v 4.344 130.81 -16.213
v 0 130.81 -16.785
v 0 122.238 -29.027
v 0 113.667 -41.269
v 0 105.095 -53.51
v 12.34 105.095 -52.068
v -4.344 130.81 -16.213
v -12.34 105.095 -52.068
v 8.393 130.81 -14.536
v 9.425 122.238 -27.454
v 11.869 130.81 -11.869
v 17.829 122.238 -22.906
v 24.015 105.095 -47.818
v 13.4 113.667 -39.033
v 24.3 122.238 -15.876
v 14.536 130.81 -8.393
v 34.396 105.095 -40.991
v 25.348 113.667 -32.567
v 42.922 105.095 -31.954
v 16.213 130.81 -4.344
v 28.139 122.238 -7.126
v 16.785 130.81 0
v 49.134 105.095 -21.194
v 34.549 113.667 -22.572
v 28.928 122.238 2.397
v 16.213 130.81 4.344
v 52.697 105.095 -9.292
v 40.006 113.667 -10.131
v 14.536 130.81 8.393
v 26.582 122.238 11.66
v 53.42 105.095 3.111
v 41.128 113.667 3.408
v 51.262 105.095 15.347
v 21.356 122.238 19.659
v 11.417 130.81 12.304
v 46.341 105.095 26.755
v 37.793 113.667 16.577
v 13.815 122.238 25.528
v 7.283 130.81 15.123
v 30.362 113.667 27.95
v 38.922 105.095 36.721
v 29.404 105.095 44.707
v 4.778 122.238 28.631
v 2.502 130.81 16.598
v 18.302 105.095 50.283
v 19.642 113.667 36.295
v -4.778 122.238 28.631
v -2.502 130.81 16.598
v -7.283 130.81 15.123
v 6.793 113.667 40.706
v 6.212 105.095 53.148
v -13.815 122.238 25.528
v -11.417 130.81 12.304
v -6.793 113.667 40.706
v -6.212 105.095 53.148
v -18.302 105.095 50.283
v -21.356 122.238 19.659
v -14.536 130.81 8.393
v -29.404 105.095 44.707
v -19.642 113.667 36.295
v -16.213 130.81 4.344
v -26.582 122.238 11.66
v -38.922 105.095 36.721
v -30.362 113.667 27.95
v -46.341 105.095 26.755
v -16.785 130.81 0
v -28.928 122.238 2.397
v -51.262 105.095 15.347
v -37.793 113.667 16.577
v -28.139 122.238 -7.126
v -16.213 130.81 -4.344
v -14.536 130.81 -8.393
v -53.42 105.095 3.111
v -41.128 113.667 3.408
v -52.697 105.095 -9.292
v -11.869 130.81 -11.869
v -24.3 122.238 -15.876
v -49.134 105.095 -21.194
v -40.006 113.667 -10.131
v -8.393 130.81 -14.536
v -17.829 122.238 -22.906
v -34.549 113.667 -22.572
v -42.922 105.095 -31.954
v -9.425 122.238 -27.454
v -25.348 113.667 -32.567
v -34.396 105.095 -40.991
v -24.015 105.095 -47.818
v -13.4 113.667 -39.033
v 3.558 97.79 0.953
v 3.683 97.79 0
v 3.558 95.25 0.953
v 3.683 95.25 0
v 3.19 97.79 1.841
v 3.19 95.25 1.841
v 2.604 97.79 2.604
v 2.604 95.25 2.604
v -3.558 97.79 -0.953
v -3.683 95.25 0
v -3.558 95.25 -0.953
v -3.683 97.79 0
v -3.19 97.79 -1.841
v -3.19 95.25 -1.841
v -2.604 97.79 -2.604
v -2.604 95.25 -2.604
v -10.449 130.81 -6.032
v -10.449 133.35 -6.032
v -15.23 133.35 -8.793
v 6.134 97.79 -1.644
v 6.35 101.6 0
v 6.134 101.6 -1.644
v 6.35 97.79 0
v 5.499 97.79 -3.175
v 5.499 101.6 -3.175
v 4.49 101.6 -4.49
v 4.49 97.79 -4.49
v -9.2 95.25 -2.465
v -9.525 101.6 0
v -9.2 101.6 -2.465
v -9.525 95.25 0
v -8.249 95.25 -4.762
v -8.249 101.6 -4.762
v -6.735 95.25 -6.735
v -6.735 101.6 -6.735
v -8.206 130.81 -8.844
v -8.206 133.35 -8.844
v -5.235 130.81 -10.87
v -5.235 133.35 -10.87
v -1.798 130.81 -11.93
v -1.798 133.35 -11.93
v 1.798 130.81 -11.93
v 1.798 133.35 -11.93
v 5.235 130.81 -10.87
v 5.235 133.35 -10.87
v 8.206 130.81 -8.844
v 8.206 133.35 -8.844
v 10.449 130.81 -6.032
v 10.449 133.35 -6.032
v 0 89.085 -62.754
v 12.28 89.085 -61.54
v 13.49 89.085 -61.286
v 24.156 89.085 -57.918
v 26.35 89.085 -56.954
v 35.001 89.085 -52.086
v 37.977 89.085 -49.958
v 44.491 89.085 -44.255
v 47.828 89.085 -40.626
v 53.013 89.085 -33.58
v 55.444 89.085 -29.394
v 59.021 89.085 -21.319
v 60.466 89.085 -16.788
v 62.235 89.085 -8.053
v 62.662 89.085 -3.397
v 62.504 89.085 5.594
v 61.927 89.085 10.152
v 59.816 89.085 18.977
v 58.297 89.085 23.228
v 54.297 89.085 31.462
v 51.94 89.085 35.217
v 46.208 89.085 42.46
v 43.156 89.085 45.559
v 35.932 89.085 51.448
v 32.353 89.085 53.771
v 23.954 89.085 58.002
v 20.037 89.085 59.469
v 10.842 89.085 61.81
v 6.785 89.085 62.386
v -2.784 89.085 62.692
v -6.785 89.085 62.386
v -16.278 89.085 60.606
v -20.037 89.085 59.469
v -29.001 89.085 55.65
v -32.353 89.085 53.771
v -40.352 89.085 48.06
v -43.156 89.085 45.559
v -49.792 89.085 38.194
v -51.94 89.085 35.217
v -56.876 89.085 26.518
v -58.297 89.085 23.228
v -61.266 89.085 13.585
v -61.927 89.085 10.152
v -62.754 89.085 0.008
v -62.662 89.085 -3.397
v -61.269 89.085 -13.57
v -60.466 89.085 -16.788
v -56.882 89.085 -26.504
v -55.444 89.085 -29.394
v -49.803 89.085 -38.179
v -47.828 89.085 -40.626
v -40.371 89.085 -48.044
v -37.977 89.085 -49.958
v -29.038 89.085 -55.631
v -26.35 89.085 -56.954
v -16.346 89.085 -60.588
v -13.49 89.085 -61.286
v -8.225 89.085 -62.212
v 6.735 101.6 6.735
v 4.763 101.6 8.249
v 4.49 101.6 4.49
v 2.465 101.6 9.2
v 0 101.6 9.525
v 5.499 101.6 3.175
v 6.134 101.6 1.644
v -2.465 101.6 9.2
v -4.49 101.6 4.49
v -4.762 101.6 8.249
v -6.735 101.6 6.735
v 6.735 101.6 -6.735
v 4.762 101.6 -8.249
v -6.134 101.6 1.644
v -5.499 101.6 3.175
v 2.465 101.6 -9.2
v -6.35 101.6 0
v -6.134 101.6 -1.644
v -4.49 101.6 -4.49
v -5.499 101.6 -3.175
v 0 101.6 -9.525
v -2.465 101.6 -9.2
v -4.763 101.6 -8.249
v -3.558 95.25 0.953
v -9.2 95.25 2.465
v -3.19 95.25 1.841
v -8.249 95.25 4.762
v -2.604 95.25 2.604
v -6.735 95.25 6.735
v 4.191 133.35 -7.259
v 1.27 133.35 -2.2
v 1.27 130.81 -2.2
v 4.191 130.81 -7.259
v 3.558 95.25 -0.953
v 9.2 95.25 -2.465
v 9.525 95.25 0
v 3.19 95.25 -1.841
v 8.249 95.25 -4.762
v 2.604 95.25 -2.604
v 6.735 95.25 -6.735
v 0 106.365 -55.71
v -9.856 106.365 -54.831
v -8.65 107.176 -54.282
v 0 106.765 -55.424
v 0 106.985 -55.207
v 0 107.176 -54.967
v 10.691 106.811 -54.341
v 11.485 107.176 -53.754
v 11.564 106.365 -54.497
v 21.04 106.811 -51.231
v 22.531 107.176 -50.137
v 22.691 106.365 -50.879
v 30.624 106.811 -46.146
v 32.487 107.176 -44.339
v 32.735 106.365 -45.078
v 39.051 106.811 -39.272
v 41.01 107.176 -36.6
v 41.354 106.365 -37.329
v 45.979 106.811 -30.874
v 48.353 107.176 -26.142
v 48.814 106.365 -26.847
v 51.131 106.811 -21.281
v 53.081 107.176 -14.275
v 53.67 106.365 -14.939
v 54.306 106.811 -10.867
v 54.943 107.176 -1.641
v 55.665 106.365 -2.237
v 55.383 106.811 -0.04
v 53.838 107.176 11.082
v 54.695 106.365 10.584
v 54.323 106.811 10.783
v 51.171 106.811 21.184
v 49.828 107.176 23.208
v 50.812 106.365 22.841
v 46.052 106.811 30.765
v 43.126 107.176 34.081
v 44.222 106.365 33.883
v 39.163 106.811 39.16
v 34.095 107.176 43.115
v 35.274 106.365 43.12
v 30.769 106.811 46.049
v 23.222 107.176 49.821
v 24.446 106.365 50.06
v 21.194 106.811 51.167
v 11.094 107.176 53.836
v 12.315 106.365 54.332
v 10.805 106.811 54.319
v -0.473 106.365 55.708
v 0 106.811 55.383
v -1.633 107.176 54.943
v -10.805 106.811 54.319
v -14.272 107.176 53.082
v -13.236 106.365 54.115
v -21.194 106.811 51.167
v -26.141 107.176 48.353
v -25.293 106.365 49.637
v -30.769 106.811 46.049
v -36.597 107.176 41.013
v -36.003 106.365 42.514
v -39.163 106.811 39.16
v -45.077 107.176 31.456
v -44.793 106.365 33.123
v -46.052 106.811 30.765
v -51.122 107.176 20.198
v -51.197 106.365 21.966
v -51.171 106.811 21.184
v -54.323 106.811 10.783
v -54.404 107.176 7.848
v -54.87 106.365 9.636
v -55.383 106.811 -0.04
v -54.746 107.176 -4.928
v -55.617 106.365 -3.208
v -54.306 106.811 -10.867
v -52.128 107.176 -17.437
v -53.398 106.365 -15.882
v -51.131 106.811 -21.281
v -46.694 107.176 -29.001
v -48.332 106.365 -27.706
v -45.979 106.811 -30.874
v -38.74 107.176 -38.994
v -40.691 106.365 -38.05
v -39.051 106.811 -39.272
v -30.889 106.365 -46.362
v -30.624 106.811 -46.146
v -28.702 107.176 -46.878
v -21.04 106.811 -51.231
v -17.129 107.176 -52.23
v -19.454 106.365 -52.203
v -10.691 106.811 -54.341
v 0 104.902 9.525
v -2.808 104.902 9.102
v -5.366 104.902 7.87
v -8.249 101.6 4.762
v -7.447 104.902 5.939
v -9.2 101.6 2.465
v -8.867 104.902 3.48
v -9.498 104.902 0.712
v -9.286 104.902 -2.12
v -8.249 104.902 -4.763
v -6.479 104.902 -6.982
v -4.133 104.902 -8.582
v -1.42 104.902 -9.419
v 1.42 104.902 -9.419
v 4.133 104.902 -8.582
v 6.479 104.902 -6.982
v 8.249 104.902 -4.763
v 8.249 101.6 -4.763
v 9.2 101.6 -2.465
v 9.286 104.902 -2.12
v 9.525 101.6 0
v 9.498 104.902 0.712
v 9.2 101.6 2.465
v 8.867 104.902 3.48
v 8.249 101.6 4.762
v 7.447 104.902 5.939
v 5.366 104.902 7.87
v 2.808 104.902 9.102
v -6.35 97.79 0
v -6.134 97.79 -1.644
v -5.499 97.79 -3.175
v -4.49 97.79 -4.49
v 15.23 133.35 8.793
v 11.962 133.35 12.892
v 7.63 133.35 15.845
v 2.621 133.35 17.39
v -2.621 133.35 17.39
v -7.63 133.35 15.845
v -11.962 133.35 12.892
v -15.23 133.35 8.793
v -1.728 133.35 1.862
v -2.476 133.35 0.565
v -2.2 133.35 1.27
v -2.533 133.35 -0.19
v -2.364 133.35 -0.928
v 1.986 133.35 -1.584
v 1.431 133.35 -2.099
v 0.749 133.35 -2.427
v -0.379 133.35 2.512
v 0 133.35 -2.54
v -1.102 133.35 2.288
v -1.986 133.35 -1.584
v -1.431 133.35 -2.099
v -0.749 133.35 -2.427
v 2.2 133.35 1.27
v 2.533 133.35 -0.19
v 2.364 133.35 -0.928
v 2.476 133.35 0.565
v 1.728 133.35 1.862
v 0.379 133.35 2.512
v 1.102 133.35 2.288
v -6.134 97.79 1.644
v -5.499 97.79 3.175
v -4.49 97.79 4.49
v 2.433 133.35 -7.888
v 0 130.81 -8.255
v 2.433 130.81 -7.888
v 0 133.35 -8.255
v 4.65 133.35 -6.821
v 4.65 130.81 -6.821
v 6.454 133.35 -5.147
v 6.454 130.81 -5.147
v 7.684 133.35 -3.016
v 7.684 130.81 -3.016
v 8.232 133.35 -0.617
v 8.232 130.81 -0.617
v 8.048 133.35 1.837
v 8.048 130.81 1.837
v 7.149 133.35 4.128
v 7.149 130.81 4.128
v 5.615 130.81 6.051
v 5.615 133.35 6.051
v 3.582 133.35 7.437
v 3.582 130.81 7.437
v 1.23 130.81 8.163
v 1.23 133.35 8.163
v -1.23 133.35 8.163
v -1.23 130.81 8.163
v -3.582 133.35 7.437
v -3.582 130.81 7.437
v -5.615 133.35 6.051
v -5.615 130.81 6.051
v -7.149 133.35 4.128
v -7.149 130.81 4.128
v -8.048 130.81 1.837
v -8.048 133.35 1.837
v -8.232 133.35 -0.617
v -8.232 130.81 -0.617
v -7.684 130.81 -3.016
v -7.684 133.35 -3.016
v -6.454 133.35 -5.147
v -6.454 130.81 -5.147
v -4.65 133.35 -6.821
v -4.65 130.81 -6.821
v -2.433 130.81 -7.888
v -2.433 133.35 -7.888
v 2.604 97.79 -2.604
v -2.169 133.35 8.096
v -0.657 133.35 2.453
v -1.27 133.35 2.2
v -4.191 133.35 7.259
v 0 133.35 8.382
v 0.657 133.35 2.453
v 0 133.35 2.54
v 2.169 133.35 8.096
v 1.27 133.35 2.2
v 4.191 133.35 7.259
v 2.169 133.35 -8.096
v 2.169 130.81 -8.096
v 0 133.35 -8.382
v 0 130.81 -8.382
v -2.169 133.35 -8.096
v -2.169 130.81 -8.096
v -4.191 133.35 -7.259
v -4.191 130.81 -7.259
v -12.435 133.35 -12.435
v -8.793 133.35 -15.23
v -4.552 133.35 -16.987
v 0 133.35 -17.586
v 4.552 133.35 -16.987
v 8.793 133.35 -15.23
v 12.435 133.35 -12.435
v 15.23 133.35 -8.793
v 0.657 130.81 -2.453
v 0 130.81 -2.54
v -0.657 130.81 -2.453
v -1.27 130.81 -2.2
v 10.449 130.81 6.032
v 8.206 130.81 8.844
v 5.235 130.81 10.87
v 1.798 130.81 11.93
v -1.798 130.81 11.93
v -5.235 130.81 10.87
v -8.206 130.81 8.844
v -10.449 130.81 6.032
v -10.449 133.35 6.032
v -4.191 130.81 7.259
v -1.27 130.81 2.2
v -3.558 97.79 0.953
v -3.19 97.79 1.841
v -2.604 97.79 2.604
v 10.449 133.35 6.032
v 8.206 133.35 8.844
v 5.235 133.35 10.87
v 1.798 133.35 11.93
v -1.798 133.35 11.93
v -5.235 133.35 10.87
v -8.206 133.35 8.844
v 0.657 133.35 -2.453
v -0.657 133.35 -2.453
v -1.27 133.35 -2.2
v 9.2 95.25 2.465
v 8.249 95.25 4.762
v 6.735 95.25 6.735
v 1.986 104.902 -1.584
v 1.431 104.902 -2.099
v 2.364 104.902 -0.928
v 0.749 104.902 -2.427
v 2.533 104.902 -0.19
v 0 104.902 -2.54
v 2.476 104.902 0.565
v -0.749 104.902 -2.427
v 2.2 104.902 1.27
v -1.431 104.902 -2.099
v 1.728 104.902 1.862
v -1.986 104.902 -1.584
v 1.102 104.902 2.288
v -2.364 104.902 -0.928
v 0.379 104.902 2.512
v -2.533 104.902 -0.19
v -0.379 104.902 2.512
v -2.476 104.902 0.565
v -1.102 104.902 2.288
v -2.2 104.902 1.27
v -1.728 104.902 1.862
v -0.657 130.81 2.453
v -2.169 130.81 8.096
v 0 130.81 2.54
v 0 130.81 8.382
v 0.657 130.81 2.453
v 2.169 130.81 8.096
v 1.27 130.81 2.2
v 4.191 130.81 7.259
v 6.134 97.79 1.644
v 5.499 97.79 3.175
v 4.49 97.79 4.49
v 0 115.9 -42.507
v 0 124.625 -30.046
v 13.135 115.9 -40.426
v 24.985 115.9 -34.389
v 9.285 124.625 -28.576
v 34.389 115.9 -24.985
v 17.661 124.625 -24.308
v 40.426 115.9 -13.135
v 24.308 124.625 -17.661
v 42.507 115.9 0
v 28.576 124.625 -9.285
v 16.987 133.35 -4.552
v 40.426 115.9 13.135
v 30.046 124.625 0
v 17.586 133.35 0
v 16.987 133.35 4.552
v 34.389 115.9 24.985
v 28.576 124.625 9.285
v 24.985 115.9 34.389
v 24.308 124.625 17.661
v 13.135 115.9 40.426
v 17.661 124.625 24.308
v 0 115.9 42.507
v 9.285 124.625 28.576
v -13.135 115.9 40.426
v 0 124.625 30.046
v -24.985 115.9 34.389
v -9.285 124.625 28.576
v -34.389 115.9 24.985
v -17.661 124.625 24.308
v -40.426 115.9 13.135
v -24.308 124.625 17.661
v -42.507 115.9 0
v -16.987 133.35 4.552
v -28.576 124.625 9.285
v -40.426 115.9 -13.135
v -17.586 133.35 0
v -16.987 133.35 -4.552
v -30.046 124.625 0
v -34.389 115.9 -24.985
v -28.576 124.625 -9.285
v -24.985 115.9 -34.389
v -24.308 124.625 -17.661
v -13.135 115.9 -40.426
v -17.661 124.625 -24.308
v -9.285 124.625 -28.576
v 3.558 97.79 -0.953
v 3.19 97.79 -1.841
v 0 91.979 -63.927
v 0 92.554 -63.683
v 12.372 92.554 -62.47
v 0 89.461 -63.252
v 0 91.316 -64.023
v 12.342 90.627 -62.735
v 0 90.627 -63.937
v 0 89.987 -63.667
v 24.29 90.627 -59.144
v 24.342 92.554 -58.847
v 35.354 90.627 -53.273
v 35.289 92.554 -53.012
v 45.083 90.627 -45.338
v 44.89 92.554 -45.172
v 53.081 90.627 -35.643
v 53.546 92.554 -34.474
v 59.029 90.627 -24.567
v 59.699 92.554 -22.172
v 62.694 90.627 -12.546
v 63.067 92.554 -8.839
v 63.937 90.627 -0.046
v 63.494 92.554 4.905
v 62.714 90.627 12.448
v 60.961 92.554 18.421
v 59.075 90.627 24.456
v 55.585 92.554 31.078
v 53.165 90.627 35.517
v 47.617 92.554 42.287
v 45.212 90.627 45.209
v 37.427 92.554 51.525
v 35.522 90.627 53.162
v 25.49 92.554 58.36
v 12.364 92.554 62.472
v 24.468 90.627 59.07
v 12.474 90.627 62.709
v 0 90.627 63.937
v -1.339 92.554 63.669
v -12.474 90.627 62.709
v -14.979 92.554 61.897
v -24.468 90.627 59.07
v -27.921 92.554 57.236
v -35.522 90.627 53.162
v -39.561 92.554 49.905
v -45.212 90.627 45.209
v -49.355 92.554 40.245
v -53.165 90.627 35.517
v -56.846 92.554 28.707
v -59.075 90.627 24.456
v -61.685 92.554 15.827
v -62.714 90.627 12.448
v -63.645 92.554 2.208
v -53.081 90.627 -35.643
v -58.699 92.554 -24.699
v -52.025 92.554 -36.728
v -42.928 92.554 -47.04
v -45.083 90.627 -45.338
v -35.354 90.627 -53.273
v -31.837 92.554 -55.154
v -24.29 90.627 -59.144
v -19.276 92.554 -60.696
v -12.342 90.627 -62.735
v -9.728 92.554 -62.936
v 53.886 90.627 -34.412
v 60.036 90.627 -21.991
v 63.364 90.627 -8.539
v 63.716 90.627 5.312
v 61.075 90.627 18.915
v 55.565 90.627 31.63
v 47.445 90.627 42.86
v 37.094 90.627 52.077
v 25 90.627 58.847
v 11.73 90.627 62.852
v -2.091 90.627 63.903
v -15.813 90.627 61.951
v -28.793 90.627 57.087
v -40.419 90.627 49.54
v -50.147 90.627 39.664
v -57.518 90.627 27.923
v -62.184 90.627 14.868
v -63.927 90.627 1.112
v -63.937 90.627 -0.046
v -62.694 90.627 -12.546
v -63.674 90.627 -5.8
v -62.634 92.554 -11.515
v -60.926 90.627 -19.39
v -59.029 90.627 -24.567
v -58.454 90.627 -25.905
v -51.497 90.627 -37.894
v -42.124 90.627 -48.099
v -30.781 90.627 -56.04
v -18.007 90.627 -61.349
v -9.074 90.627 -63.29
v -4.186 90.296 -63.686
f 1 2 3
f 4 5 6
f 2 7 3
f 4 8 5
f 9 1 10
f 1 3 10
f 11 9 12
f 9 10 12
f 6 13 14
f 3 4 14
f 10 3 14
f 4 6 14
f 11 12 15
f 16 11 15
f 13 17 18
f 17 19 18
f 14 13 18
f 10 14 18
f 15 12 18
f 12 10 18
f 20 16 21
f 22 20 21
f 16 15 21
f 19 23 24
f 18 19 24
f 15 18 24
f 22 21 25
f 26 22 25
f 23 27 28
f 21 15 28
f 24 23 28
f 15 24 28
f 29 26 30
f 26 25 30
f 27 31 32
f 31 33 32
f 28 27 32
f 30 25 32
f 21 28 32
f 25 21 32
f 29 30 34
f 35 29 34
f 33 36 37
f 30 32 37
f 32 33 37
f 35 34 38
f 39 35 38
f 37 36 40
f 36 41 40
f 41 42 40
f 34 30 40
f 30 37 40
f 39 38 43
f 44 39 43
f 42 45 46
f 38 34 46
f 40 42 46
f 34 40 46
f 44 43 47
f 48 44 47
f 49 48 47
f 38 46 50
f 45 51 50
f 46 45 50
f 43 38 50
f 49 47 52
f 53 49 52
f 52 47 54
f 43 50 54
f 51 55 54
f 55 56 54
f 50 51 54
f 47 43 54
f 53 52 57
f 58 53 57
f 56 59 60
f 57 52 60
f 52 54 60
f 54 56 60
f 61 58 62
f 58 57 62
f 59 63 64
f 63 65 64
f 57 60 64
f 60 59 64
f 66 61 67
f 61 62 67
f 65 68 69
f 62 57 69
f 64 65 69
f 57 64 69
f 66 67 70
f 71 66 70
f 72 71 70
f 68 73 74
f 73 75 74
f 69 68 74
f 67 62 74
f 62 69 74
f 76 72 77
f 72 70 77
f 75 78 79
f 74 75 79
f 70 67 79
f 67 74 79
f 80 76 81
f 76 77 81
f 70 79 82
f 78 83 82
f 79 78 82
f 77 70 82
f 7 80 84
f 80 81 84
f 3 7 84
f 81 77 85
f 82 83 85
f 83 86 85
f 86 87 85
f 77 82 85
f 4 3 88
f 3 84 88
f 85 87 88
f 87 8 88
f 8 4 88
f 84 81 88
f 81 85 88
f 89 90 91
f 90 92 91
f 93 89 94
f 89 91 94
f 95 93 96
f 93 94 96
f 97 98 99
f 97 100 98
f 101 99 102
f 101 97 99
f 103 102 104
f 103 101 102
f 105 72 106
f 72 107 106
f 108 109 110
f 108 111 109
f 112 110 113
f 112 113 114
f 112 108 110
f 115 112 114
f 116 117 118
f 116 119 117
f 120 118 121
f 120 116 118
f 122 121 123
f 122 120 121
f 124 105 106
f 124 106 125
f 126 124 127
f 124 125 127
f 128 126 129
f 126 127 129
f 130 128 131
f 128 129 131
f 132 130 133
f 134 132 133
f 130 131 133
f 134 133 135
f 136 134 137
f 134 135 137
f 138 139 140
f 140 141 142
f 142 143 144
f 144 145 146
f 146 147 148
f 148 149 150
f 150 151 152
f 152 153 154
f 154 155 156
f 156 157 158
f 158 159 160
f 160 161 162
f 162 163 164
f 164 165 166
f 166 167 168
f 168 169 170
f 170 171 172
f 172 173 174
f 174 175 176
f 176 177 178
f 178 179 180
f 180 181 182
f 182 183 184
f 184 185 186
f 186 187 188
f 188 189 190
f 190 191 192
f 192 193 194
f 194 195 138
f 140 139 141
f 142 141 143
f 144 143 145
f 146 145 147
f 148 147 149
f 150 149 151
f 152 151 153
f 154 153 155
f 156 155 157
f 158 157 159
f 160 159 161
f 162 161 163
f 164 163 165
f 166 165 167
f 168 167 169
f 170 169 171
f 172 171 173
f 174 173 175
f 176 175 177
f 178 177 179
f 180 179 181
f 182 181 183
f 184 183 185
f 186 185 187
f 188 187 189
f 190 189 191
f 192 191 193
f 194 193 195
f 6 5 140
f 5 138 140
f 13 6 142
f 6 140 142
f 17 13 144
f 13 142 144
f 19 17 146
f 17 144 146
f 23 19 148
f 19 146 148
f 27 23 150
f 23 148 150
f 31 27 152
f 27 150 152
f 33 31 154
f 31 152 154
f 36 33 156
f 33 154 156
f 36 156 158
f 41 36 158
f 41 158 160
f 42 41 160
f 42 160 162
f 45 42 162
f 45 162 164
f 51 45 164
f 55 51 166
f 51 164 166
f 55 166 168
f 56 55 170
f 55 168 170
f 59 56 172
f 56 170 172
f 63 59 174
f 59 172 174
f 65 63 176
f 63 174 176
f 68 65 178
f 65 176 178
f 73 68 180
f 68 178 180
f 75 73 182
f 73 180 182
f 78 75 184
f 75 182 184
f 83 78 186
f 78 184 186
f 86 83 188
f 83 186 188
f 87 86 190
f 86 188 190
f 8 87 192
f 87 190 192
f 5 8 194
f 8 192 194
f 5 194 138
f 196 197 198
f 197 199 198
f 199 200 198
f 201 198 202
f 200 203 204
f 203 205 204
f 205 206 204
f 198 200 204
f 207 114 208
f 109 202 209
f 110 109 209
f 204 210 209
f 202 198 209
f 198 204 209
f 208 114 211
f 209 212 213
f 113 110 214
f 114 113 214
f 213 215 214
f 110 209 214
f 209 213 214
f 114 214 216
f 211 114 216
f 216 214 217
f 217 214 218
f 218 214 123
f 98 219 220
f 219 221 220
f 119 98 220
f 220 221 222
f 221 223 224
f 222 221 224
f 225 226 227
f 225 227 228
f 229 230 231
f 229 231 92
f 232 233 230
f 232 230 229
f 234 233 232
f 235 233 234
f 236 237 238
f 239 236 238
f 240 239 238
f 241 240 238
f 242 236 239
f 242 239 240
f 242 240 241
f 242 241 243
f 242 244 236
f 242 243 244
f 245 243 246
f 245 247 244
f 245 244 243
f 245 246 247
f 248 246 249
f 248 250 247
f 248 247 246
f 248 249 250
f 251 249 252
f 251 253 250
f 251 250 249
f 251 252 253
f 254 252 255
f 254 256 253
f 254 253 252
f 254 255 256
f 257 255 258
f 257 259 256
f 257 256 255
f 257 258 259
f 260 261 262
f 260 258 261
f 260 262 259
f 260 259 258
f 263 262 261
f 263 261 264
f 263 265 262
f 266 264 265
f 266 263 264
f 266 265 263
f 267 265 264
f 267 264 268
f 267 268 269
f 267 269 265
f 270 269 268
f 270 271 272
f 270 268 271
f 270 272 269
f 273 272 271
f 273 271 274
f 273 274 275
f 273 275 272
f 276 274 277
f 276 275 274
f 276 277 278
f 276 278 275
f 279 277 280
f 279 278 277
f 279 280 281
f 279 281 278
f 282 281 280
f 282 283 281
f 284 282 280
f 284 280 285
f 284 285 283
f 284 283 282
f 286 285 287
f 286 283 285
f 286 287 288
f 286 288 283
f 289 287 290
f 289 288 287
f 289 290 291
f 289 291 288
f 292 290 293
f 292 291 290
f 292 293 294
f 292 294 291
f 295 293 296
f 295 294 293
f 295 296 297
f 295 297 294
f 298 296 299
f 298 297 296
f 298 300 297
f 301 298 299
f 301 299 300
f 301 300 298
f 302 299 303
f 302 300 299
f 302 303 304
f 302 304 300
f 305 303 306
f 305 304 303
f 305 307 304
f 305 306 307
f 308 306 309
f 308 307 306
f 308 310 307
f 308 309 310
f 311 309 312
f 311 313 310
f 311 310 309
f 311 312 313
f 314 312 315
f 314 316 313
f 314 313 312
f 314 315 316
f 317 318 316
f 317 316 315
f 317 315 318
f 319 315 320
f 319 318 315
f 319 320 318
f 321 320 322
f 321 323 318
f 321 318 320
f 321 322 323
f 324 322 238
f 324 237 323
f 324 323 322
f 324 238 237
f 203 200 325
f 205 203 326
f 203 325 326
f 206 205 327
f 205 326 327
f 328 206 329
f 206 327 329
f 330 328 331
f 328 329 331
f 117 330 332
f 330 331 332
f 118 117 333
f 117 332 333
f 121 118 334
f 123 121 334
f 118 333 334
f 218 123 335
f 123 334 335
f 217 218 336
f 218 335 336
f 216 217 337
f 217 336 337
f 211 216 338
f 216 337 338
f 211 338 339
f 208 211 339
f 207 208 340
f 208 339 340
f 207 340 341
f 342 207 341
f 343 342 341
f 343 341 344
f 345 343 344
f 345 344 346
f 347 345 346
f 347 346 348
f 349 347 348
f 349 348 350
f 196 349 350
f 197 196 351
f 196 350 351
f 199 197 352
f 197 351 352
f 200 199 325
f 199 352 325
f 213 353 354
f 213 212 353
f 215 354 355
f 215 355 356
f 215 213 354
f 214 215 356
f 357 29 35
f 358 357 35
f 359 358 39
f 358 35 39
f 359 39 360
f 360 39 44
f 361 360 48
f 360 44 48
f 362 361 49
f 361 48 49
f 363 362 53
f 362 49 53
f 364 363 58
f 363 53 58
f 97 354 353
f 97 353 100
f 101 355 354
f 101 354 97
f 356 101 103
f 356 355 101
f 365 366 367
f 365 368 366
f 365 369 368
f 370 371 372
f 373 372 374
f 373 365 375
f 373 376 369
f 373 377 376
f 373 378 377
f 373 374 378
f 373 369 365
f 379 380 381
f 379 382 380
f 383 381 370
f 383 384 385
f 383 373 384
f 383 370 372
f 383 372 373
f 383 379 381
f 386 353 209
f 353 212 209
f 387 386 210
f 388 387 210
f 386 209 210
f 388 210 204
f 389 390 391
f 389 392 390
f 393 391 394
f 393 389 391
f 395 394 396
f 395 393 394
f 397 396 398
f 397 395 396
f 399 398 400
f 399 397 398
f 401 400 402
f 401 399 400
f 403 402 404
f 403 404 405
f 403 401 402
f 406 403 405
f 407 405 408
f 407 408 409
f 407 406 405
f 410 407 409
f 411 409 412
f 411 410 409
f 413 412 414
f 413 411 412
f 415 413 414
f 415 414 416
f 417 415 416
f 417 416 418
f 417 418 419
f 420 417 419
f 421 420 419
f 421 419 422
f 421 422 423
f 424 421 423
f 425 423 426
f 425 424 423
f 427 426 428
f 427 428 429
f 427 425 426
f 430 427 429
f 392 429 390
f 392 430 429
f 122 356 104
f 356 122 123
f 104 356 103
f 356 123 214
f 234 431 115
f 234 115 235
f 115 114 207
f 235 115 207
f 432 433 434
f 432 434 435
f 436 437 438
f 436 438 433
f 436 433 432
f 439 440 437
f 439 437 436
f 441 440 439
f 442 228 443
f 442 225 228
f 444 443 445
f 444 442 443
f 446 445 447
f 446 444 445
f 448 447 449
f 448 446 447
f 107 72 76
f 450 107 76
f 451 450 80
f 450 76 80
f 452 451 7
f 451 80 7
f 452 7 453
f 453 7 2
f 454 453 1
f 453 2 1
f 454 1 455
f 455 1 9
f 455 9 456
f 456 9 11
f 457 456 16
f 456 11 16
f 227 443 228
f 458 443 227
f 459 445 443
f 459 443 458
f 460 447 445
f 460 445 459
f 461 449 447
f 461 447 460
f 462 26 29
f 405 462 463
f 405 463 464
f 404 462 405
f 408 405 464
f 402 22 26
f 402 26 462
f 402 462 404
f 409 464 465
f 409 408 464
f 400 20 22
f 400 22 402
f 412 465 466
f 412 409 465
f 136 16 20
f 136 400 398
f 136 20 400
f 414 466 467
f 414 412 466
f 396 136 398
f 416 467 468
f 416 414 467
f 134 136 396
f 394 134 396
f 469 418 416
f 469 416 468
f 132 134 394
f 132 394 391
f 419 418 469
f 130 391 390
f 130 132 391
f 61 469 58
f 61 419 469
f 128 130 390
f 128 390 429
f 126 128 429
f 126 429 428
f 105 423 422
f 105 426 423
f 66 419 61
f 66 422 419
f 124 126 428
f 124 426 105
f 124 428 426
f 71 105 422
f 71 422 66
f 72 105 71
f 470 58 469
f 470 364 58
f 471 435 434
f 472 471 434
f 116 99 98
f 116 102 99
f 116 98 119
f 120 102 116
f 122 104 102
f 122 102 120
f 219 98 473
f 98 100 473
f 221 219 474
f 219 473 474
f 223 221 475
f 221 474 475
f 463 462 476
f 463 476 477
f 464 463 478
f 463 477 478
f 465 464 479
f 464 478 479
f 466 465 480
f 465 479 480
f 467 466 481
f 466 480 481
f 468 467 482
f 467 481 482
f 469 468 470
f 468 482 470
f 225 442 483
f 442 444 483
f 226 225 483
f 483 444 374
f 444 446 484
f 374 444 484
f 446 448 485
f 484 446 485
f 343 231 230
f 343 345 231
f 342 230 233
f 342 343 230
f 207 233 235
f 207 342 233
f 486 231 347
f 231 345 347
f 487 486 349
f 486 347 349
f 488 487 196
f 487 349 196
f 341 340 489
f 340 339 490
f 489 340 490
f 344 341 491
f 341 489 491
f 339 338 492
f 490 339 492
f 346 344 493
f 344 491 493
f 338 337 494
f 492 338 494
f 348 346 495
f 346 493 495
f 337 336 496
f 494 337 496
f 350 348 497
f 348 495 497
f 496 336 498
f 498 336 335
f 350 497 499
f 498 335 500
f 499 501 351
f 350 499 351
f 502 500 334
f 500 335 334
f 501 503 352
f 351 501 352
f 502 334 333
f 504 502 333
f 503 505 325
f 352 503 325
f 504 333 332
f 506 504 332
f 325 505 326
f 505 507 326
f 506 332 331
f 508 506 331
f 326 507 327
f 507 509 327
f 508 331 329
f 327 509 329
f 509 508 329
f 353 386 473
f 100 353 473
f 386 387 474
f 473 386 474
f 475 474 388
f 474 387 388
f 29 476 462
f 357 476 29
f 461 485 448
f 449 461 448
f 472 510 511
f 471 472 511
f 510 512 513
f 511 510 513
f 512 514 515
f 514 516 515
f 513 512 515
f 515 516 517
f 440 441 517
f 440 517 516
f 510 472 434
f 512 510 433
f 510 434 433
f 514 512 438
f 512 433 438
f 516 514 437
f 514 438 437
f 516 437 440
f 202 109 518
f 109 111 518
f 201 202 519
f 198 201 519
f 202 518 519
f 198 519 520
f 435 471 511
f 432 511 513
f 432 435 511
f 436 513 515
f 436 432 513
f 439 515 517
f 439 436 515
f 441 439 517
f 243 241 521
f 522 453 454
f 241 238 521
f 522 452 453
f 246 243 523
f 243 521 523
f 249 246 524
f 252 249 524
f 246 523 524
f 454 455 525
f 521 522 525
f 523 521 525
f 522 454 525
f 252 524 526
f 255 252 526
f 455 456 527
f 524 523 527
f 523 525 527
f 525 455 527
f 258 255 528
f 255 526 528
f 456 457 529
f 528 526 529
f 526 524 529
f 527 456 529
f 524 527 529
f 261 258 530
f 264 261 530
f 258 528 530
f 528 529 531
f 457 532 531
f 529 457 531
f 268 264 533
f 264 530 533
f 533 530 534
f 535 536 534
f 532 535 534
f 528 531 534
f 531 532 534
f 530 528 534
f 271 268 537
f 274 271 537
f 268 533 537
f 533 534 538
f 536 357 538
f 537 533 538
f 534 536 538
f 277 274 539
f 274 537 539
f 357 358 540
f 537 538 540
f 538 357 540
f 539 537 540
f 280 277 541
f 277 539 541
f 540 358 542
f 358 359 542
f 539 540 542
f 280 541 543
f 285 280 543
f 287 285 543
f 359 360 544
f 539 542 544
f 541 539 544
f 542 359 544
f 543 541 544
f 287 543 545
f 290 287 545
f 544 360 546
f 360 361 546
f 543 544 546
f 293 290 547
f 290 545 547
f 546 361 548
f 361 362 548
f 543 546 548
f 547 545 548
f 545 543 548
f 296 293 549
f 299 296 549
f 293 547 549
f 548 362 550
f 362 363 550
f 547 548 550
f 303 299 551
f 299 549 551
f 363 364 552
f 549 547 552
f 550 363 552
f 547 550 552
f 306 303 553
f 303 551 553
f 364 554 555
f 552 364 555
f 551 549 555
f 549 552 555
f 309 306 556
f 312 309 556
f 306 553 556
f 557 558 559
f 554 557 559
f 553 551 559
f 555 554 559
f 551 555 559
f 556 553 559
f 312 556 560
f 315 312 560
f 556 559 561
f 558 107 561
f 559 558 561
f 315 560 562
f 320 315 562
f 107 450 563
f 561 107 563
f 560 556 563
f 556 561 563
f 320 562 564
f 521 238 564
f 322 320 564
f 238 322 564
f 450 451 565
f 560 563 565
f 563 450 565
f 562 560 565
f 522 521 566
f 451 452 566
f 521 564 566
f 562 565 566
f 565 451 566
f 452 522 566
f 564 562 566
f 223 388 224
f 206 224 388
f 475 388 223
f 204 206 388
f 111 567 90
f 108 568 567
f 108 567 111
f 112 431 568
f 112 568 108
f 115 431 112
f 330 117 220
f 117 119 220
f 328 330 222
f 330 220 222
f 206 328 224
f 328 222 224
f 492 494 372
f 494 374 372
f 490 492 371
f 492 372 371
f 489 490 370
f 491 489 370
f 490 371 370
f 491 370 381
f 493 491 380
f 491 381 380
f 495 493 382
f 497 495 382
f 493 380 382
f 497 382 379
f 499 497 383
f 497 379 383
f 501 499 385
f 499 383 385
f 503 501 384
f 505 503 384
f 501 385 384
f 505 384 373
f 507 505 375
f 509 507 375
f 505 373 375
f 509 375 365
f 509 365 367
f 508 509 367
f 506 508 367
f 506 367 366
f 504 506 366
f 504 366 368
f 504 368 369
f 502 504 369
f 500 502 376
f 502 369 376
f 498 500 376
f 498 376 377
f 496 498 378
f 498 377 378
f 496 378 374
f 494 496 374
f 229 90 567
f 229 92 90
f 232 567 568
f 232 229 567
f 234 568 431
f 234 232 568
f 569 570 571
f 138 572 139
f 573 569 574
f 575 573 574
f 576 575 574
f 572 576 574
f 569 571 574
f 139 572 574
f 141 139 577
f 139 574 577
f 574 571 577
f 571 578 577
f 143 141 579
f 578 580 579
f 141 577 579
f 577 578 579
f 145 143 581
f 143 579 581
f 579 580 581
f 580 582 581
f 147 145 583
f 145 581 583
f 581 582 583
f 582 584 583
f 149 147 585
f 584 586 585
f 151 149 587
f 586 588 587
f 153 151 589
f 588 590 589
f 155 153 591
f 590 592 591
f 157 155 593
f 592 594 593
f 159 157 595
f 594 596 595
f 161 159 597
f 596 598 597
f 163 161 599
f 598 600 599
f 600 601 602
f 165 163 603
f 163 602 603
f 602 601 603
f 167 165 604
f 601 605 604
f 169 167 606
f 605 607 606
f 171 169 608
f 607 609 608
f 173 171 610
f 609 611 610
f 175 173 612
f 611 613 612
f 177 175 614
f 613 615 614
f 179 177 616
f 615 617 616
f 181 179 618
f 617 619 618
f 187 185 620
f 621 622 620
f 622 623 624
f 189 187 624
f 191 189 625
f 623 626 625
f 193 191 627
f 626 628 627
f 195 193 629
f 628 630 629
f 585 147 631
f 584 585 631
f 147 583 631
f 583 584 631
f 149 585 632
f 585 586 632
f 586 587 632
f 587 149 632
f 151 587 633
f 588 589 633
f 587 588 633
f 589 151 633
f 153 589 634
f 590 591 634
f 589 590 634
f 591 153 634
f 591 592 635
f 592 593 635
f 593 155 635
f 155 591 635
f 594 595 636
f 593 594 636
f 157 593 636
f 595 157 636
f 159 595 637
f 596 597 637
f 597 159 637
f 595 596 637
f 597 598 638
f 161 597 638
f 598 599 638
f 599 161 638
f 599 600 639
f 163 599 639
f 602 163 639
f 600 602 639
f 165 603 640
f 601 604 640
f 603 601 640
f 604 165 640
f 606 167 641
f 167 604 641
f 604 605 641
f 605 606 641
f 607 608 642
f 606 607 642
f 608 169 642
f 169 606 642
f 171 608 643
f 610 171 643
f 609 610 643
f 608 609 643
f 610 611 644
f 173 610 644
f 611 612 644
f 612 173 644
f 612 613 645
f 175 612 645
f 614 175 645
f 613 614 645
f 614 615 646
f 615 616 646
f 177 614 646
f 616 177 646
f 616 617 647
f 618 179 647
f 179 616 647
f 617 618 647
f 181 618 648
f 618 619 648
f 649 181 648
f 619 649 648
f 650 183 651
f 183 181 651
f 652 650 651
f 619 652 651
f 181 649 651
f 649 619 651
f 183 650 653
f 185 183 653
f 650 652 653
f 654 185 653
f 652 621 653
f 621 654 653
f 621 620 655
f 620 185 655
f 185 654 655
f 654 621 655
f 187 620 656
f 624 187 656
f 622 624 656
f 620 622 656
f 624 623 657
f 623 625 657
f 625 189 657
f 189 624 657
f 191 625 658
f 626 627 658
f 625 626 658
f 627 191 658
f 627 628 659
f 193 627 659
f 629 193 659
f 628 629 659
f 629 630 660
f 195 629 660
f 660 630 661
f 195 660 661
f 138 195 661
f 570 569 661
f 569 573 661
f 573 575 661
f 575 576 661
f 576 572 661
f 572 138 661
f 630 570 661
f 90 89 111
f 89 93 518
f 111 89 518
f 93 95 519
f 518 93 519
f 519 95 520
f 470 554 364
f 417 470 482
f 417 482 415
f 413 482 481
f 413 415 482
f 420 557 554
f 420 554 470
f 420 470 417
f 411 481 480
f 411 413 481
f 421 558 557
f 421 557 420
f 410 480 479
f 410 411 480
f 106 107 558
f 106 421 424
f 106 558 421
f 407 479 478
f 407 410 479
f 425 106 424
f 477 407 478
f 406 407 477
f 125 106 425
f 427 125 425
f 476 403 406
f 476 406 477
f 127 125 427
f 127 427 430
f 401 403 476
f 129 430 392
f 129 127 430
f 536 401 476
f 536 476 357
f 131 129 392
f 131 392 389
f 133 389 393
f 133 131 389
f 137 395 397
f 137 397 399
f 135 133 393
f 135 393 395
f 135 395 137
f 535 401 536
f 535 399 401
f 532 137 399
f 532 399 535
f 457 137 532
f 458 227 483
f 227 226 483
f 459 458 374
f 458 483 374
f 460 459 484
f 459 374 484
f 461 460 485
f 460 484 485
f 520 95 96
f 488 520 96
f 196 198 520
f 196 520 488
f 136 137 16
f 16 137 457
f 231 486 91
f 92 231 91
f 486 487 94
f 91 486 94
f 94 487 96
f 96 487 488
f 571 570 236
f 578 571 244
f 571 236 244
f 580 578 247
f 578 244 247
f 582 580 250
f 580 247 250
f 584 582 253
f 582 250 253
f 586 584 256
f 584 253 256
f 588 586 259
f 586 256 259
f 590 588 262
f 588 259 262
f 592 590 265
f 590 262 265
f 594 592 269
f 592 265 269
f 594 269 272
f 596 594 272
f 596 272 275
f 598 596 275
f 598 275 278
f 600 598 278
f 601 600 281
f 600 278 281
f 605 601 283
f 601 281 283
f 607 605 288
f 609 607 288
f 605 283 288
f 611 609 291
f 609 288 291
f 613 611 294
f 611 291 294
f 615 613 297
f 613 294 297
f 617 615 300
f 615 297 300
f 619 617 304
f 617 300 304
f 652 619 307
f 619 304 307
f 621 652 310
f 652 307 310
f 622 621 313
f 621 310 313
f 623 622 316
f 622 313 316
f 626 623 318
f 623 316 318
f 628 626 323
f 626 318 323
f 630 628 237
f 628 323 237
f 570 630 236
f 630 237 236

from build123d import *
from build123d.topology import SkipClean

# Parameters (mm, degrees)
REVOLVE5_ANGLE  = 90
SKETCH1_24_W    = 2.54
SKETCH1_24_H    = 25.908
SKETCH1_24_H_2  = 2.54
SKETCH1_24_W_2  = 3.81
REVOLVE9_ANGLE  = 60
SKETCH2_W       = 5.842
SKETCH2_H       = 2.54
REVOLVE10_ANGLE = 60
FILLET1_R       = 2.54
FILLET2_R       = 2.54


with BuildPart() as part:
    # Sketch1 → Revolve4 (revolve)
    with BuildSketch(Plane.XY, mode=Mode.PRIVATE) as revolve4_sk:
        Polygon((9.525, 101.6), (9.525, 104.902), (2.54, 104.902), (0, 104.902), (0, 101.6), (6.35, 101.6), align=None)
    revolve(revolve4_sk.sketch.rotate(Axis((0, 133.35, 0), (0, -1, 0)), 90), axis=Axis((0, 133.35, 0), (0, -1, 0)))

    # Sketch1<21> → Revolve5 (revolve, symmetric)
    with SkipClean():  # the faces are left unmerged after this step: merging them gives an invalid solid
        with BuildSketch(Plane.XY) as revolve5_sk:
            Polygon((9.525, 95.25), (9.525, 101.6), (6.35, 101.6), (6.35, 97.79), (3.683, 97.79), (3.683, 95.25), align=None)
            Polygon((-6.35, 97.79), (-6.35, 101.6), (-9.525, 101.6), (-9.525, 95.25), (-3.683, 95.25), (-3.683, 97.79), align=None)
        revolve(axis=Axis((0, 133.35, 0), (0, -1, 0)), revolution_arc=REVOLVE5_ANGLE / 2)
        revolve(revolve5_sk.sketch, axis=Axis((0, 133.35, 0), (0, 1, 0)), revolution_arc=REVOLVE5_ANGLE / 2)
    add(part.part.scale(1), mode=Mode.REPLACE)  # the faces are merged on a copy

    # Sketch1<24> → Revolve7 (revolve)
    with BuildSketch(Plane.XY, mode=Mode.PRIVATE) as revolve7_sk:
        with Locations((1.27, 117.856)):
            Rectangle(SKETCH1_24_W, SKETCH1_24_H)
        with Locations((1.27, 132.08)):
            Rectangle(SKETCH1_24_W, SKETCH1_24_H_2)
        Polygon((53.510192793, 105.094916695), (62.753640571, 89.084795506), (64.953345097, 90.354795506), (55.428345097, 106.852579448), (17.586106751, 133.35), (16.785247828, 130.81), align=None)
        with Locations((10.16, 132.08)):
            Rectangle(SKETCH1_24_W_2, SKETCH1_24_H_2)
    revolve(revolve7_sk.sketch.rotate(Axis((0, 133.35, 0), (0, -1, 0)), 270), axis=Axis((0, 133.35, 0), (0, -1, 0)))


with BuildPart() as revolve7_piece_1:
    # of the separate pieces the step leaves, piece 1, a body of its own (revolve7_pieces)
    add(part.part.solids().sort_by_distance((0, 105.094916695, -53.510192793))[0])



with BuildPart() as revolve7_piece_2:
    # of the separate pieces the step leaves, piece 2, a body of its own (revolve7_pieces)
    add(part.part.solids().sort_by_distance((0, 101.6, 9.525))[0])


with BuildPart() as revolve7_piece_3:
    # of the separate pieces the step leaves, piece 3, a body of its own (revolve7_pieces)
    add(part.part.solids().sort_by_distance((0, 133.35, -8.255))[0])


with BuildPart() as revolve7_piece_1_1:
    add(revolve7_piece_1.part)

    add(revolve7_piece_3.part)  # Revolve9 merges Revolve7 piece 3
    # Sketch1<29> → Revolve9 (revolve, symmetric)
    with BuildSketch(Plane.XY) as revolve9_sk:
        Polygon((12.065, 133.35), (12.065, 130.81), (16.785247828, 130.81), (17.586106751, 133.35), align=None)
        Polygon((-16.785247828, 130.81), (-12.065, 130.81), (-12.065, 133.35), (-17.586106751, 133.35), align=None)
    revolve(axis=Axis((0, 133.35, 0), (0, -1, 0)), revolution_arc=REVOLVE9_ANGLE / 2)
    revolve(revolve9_sk.sketch, axis=Axis((0, 133.35, 0), (0, 1, 0)), revolution_arc=REVOLVE9_ANGLE / 2)

    # Fillet1
    fillet1_edges = [revolve7_piece_1_1.edges().sort_by_distance(p)[0] for p in [
        (0, 90.354795506, 64.953345097),
    ]]
    fillet(fillet1_edges, radius=FILLET1_R - 0.0001)  # a hair under: the kernel refuses the full size

    # Fillet2
    fillet2_edges = [revolve7_piece_1_1.edges().sort_by_distance(p)[0] for p in [
        (0, 106.852579448, 55.428345097),
    ]]
    fillet(fillet2_edges, radius=FILLET2_R)


with BuildPart() as body_3:
    # Sketch2 → Revolve10 (revolve, symmetric)
    with BuildSketch(Plane(origin=(0, 0, 0), x_dir=(0, 0, -1), z_dir=(1, 0, 0))) as revolve10_sk:
        with Locations((-5.461, 132.08)):
            Rectangle(SKETCH2_W, SKETCH2_H)
        with Locations((5.461, 132.08)):
            Rectangle(SKETCH2_W, SKETCH2_H)
    revolve(axis=Axis((0, 133.35, 0), (0, -1, 0)), revolution_arc=REVOLVE10_ANGLE / 2)
    revolve(revolve10_sk.sketch, axis=Axis((0, 133.35, 0), (0, 1, 0)), revolution_arc=REVOLVE10_ANGLE / 2)


solid = Compound([revolve7_piece_2.part, revolve7_piece_1_1.part, body_3.part])
